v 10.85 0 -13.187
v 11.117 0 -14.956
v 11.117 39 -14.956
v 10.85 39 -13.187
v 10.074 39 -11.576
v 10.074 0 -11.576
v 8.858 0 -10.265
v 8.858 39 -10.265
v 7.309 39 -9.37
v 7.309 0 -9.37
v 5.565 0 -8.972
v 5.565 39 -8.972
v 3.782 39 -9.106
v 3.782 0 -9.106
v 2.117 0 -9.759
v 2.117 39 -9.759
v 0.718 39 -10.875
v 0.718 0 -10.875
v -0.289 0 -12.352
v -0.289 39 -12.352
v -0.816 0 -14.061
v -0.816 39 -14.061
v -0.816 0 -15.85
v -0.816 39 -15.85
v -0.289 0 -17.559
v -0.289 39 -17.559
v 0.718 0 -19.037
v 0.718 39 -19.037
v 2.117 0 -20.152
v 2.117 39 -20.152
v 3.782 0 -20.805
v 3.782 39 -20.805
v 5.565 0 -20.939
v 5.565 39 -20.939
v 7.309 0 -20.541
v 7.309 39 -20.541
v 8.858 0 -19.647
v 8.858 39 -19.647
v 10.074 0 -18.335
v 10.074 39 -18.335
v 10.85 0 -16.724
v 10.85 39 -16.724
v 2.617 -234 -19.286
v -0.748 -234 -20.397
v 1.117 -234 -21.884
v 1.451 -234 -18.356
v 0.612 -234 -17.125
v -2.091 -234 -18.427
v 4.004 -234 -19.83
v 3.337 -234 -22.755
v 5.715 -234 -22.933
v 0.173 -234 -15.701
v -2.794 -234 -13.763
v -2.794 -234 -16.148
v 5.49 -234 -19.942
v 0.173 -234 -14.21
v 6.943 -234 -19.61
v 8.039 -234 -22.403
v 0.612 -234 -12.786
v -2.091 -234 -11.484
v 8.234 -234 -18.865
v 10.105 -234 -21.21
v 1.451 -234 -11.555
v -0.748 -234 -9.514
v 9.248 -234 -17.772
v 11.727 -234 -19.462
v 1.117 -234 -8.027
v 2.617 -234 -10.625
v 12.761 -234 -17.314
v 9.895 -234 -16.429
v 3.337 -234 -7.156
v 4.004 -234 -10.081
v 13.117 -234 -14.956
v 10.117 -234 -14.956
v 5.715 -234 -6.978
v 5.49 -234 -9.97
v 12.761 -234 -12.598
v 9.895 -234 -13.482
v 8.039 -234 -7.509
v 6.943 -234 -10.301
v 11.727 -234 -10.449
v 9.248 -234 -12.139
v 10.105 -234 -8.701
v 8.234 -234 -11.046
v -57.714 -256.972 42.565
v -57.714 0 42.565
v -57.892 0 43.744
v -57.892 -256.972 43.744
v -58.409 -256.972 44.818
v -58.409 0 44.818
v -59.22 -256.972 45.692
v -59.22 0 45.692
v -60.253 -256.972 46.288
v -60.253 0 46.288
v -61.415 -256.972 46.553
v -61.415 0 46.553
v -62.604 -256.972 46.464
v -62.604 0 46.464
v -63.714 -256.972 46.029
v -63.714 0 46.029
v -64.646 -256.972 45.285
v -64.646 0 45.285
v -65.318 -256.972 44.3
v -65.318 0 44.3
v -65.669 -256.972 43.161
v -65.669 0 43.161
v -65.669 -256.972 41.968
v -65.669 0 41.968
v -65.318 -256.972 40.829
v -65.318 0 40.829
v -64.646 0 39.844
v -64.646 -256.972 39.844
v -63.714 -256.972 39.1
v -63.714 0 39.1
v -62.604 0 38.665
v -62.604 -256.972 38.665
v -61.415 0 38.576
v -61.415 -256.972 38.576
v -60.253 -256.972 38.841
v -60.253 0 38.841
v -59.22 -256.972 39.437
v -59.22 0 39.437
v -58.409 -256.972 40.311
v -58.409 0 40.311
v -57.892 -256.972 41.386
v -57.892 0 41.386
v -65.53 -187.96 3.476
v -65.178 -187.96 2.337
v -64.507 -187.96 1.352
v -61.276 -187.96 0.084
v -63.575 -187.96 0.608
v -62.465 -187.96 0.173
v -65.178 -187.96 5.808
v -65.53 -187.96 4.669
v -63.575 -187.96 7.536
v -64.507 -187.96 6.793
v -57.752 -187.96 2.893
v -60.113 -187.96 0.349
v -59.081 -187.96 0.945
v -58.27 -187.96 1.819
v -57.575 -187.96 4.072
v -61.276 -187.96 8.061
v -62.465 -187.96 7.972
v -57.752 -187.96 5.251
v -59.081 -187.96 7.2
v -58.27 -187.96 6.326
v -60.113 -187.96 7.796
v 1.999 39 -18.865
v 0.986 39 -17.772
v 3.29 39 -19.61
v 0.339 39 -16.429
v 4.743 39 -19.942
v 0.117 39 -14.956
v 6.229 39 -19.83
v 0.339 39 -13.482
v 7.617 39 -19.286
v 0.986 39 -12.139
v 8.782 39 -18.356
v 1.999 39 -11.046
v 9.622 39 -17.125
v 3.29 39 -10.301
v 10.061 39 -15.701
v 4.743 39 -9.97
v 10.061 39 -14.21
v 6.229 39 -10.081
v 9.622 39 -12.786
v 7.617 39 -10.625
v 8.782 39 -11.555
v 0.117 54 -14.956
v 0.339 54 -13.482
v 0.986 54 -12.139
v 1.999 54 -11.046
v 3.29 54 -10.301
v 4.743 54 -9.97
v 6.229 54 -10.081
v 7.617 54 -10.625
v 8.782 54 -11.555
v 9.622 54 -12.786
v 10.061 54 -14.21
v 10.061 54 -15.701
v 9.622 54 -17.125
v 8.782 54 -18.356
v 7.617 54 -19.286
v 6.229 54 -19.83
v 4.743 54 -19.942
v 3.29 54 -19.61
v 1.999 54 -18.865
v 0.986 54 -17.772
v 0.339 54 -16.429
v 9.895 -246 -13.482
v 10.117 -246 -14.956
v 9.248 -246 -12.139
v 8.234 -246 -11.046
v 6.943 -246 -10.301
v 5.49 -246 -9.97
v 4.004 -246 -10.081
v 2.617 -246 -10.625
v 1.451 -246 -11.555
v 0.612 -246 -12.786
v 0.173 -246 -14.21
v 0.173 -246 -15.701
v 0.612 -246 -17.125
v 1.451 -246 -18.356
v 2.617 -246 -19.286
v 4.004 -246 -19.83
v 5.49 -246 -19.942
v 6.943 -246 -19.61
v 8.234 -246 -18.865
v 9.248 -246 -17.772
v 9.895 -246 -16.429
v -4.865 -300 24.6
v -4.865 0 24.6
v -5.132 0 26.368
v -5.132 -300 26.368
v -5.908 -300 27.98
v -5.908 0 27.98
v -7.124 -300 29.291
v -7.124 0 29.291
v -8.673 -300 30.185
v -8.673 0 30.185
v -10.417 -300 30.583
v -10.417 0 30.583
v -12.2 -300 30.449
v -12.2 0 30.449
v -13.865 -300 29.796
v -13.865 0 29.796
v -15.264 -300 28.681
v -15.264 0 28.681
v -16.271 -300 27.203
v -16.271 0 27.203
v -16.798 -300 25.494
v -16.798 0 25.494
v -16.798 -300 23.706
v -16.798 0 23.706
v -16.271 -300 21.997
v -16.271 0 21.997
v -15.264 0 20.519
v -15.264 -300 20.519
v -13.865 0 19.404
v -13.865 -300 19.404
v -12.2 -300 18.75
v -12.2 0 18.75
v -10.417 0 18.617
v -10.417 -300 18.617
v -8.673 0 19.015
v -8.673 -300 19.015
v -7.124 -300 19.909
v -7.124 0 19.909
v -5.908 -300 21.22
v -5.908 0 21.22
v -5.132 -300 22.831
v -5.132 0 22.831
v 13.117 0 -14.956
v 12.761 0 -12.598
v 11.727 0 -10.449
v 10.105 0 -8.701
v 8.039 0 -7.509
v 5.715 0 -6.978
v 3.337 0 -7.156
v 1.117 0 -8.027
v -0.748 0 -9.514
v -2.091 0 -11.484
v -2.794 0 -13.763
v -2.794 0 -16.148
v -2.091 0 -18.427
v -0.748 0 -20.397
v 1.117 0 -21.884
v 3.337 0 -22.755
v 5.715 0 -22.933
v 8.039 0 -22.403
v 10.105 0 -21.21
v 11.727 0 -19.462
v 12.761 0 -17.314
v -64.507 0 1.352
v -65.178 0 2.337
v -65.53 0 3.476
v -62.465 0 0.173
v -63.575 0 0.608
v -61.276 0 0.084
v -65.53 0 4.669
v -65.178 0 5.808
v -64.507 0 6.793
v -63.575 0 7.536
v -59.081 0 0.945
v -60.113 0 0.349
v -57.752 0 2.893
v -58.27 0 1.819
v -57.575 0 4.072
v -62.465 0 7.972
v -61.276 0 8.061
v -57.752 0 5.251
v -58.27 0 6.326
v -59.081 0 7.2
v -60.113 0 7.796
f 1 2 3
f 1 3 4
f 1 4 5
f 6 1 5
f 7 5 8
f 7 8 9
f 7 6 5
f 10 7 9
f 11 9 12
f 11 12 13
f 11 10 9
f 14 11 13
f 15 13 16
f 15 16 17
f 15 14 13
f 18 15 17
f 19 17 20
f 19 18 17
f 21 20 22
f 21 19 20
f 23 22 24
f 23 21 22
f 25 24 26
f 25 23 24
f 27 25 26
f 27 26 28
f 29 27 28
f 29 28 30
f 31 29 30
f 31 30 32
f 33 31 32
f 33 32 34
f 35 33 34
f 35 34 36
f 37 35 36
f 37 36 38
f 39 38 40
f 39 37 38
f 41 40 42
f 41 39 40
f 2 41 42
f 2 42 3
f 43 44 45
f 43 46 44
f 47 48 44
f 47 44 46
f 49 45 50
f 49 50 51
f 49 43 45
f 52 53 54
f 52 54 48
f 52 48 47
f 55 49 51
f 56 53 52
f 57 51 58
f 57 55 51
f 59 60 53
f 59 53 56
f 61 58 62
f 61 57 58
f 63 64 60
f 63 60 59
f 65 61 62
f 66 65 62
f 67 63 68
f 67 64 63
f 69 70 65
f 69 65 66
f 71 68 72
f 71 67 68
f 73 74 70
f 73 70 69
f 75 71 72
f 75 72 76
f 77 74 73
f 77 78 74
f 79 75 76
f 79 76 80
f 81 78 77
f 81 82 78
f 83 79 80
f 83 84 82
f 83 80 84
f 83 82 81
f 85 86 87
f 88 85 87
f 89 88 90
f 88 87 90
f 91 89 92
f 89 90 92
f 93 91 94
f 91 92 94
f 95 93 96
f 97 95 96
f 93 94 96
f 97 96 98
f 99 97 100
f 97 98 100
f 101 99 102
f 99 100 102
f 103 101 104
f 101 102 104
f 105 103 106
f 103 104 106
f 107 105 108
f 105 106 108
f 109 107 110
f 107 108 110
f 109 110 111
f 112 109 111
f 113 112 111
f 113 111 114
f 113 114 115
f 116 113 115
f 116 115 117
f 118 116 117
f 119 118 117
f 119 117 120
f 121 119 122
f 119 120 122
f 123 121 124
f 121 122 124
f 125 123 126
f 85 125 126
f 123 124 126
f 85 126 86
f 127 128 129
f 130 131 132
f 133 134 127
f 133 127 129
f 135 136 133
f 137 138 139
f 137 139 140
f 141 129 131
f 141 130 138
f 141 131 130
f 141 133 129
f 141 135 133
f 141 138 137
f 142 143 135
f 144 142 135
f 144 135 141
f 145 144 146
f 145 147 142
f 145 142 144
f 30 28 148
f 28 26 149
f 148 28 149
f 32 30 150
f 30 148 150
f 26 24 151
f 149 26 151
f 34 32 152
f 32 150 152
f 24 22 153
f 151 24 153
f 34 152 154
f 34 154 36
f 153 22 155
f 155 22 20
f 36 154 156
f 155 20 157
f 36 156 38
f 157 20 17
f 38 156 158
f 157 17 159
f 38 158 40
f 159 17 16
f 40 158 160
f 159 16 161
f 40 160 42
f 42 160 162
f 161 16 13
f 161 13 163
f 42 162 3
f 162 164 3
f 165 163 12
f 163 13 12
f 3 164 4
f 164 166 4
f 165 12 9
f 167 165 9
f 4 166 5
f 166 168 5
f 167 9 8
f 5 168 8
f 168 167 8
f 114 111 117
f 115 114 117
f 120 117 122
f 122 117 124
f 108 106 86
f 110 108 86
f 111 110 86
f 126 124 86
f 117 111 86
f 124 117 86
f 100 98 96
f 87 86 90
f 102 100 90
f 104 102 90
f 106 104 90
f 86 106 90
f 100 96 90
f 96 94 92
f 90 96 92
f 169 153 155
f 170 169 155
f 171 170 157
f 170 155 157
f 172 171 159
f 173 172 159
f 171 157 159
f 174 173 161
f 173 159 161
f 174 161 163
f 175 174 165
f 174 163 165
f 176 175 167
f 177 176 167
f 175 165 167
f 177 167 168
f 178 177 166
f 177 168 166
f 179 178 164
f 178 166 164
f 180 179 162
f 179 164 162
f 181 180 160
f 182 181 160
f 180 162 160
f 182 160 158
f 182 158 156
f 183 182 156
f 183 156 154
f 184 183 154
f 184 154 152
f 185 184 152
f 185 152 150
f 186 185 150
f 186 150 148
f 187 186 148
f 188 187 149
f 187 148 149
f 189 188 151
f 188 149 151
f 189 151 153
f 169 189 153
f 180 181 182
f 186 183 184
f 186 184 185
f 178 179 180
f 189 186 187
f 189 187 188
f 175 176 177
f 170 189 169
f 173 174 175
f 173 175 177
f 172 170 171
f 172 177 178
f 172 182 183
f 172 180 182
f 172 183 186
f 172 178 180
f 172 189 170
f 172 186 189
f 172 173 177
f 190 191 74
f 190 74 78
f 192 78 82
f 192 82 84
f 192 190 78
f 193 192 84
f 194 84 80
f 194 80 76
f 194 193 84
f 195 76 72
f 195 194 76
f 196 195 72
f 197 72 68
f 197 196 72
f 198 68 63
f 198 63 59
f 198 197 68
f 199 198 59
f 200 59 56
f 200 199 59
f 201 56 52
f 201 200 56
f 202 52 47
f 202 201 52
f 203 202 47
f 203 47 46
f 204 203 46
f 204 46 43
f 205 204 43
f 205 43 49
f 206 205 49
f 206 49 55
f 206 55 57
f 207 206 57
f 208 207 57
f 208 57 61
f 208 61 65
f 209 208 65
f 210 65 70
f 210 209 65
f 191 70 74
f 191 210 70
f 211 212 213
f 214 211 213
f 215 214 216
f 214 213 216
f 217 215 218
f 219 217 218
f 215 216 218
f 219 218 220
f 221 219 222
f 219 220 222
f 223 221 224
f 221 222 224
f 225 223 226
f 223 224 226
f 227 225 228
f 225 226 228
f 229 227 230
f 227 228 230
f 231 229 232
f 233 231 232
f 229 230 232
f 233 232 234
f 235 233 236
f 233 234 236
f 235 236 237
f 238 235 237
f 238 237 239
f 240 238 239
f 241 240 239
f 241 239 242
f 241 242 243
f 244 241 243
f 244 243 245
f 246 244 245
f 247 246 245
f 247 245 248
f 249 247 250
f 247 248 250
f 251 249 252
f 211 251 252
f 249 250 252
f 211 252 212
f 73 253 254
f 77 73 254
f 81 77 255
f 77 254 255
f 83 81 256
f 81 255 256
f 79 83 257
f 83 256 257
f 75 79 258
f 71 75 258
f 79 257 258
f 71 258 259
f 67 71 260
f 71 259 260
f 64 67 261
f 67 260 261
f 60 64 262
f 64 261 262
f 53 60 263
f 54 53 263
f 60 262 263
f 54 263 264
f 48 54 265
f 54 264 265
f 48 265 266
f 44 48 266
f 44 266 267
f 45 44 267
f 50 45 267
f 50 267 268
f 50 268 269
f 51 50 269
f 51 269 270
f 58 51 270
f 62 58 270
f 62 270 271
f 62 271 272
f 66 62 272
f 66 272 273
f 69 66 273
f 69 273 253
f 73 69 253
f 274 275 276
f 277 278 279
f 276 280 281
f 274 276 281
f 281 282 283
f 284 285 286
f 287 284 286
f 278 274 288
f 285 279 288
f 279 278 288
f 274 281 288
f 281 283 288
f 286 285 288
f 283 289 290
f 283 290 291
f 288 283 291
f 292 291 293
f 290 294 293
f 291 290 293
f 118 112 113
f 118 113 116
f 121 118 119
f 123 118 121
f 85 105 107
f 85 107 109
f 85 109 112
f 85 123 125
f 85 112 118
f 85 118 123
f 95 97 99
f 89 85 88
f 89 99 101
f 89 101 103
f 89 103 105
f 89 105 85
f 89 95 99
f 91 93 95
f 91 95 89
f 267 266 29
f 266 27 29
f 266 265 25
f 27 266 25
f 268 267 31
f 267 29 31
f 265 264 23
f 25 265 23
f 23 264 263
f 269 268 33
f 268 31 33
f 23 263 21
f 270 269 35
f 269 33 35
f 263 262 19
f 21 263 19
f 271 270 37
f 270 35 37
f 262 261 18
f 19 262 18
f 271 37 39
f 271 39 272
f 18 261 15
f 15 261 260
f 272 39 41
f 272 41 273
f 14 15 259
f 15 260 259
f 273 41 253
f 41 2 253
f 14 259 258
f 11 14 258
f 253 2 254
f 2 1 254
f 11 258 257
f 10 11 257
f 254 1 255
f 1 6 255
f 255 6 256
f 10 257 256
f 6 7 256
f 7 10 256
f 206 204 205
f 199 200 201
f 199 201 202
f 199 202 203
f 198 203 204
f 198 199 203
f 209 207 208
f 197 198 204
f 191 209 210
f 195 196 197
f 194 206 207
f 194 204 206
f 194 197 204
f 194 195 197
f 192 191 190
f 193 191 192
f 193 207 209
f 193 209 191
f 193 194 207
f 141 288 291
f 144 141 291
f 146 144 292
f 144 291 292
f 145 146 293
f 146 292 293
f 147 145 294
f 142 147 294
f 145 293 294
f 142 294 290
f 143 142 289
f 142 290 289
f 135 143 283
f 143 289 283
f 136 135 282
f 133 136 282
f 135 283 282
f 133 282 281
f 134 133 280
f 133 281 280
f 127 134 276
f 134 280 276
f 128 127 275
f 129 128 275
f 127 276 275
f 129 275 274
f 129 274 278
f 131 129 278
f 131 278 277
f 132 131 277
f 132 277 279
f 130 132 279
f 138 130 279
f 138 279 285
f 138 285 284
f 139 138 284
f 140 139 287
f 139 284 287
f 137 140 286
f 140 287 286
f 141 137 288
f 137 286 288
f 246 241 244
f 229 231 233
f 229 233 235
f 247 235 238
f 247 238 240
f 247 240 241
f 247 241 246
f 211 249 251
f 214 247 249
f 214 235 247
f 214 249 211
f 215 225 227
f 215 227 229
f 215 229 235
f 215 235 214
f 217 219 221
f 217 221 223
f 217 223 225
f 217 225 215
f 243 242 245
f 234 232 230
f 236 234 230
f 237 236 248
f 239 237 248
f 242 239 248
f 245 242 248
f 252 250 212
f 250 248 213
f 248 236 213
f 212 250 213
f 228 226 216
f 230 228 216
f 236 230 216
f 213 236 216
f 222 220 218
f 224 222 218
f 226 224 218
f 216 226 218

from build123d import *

# Parameters (mm, degrees)
F0_R      = 4
F1_DEPTH  = 256.9718
F2_DEPTH  = 187.96
F0_R_2    = 6
F3_DEPTH  = 300
F0_R_3    = 8
F4_DEPTH  = 246
F5_R      = 8
F5_R_2    = 5
F6_DEPTH  = 12
F7_R      = 6
F8_DEPTH  = 39
F9_R      = 5
F10_DEPTH = 15


with BuildPart() as f1:
    # F0 (on Front) → F1 (new body)
    with BuildSketch(Plane.XZ):
        with Locations((-61.713874, 42.564563)):
            Circle(F0_R)
    extrude(amount=F1_DEPTH)


with BuildPart() as f2:
    # F0 (on Front) → F2 (new body)
    with BuildSketch(Plane.XZ):
        with Locations((-61.574522, 4.072397)):
            Circle(F0_R)
    extrude(amount=F2_DEPTH)


with BuildPart() as f3:
    # F0 (on Front) → F3 (new body)
    with BuildSketch(Plane.XZ):
        with Locations((-10.865248, 24.599828)):
            Circle(F0_R_2)
    extrude(amount=F3_DEPTH)


with BuildPart() as f4:
    # F0 (on Front) → F4 (new body)
    with BuildSketch(Plane.XZ):
        with Locations((5.116754, -14.955557)):
            Circle(F0_R_3)
    extrude(amount=F4_DEPTH)

    # F5 (on face) → F6 (cut)
    with BuildSketch(Plane.XZ.offset(246)):
        with Locations((5.116754, -14.955557)):
            Circle(F5_R)
        with Locations((5.116754, -14.955557)):
            Circle(F5_R_2, mode=Mode.SUBTRACT)
    extrude(amount=-F6_DEPTH, mode=Mode.SUBTRACT)

    # F7 (on face) → F8 (join)
    with BuildSketch(Plane.XZ):
        with Locations((5.116754, -14.955557)):
            Circle(F7_R)
    extrude(amount=-F8_DEPTH)

    # F9 (on face) → F10 (join)
    with BuildSketch(Plane(origin=(0, 39, 0), x_dir=(-1, 0, 0), z_dir=(0, 1, 0))):
        with Locations((-5.116754, -14.955557)):
            Circle(F9_R)
    extrude(amount=F10_DEPTH)


solid = Compound([f1.part, f2.part, f3.part, f4.part])
